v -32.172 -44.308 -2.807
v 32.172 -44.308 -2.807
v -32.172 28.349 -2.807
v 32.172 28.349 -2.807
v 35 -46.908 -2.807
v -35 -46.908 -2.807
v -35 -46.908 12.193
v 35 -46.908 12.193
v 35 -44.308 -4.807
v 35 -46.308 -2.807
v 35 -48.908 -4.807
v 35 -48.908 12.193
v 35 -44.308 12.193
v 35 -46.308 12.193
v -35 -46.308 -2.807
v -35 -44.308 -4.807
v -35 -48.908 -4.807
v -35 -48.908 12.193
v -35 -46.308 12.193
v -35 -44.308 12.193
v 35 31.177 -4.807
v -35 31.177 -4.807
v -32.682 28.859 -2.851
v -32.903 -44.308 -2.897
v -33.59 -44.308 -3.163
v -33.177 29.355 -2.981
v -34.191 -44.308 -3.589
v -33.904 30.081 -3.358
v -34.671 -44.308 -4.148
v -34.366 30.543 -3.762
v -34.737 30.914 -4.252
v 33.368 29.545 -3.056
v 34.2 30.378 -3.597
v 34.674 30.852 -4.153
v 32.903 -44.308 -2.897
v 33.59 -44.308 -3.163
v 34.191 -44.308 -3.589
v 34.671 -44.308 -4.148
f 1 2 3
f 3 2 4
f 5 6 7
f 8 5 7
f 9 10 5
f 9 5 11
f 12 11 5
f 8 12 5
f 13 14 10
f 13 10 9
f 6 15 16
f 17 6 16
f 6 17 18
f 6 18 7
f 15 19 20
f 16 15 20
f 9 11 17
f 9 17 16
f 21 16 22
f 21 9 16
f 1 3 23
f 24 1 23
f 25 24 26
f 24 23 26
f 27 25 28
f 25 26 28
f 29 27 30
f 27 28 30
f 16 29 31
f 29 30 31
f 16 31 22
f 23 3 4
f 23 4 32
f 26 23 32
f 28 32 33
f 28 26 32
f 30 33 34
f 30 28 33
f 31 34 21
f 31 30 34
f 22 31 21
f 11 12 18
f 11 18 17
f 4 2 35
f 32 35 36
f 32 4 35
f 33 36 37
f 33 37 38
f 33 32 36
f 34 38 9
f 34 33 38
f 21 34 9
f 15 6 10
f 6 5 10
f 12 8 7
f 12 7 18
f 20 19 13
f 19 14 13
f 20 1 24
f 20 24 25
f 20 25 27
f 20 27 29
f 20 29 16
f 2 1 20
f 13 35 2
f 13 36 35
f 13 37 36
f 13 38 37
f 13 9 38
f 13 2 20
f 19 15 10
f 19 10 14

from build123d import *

# Parameters (mm, degrees)
F0_W        = 1.9147001281
F0_H        = 2
F0_W_2      = 0.6
F0_W_3      = 2
F0_H_2      = 15
F0_W_4      = 75.4852998719
F1_DEPTH    = 35
F2_T1_DEPTH = 82.5563676837
F2_T3_DEPTH = 84.1421356237


# Not quite as in the source:
# - a fillet or chamfer that OpenCascade refuses, or shapes differently, is made with other operations: its cross-section is extruded or revolved along the edge and cut away or added


with BuildPart() as f1:
    # F0 (on Right) → F1 (new body, symmetric)
    with BuildSketch(Plane.YZ):
        Polygon((-48.8228555396, -4.8070274784), (-48.8228555396, -2.8070274784), (-46.9081554115, -2.8070274784), (-46.9081554115, 12.1929725216), (-48.9081554115, 12.1929725216), (-48.9081554115, -4.8070274784), align=None)
        with Locations((-47.8655054756, -3.8070274784)):
            Rectangle(F0_W, F0_H)
        with Locations((-46.6081554115, -3.8070274784)):
            Rectangle(F0_W_2, F0_H)
        with Locations((-45.3081554115, 4.6929725216)):
            Rectangle(F0_W_3, F0_H_2)
        with Locations((-45.3081554115, -3.8070274784)):
            Rectangle(F0_W_3, F0_H)
        with Locations((-6.5655054756, -3.8070274784)):
            Rectangle(F0_W_4, F0_H)
    extrude(amount=F1_DEPTH, both=True)

    # F2: fillet of radius 3 on 3 edges, made by hand

    # F2_s2 → F2_t1 (cut)
    with BuildSketch(Plane.XZ.offset(-38.2482122722)):
        with BuildLine():
            ThreePointArc((32.1715728753, -2.8070274784), (33.9036236828, -3.3575377356), (35, -4.8070274784))
            Line((35, -4.8070274784), (35, -2.8070274784))
            Line((35, -2.8070274784), (32.1715728753, -2.8070274784))
        make_face()
        with BuildLine():
            ThreePointArc((-32.1715728753, -2.8070274784), (-33.9036236828, -3.3575377356), (-35, -4.8070274784))
            Line((-35, -4.8070274784), (-35, -2.8070274784))
            Line((-35, -2.8070274784), (-32.1715728753, -2.8070274784))
        make_face()
    extrude(amount=F2_T1_DEPTH, mode=Mode.SUBTRACT)

    # F2_s4 → F2_t3 (cut)
    with BuildSketch(Plane.YZ.offset(-42.0710678119)):
        with BuildLine():
            ThreePointArc((28.3487173356, -2.8070274784), (30.0807681432, -3.3575377356), (31.1771444604, -4.8070274784))
            Line((31.1771444604, -4.8070274784), (31.1771444604, -2.8070274784))
            Line((31.1771444604, -2.8070274784), (28.3487173356, -2.8070274784))
        make_face()
    extrude(amount=F2_T3_DEPTH, mode=Mode.SUBTRACT)


solid = f1.part
